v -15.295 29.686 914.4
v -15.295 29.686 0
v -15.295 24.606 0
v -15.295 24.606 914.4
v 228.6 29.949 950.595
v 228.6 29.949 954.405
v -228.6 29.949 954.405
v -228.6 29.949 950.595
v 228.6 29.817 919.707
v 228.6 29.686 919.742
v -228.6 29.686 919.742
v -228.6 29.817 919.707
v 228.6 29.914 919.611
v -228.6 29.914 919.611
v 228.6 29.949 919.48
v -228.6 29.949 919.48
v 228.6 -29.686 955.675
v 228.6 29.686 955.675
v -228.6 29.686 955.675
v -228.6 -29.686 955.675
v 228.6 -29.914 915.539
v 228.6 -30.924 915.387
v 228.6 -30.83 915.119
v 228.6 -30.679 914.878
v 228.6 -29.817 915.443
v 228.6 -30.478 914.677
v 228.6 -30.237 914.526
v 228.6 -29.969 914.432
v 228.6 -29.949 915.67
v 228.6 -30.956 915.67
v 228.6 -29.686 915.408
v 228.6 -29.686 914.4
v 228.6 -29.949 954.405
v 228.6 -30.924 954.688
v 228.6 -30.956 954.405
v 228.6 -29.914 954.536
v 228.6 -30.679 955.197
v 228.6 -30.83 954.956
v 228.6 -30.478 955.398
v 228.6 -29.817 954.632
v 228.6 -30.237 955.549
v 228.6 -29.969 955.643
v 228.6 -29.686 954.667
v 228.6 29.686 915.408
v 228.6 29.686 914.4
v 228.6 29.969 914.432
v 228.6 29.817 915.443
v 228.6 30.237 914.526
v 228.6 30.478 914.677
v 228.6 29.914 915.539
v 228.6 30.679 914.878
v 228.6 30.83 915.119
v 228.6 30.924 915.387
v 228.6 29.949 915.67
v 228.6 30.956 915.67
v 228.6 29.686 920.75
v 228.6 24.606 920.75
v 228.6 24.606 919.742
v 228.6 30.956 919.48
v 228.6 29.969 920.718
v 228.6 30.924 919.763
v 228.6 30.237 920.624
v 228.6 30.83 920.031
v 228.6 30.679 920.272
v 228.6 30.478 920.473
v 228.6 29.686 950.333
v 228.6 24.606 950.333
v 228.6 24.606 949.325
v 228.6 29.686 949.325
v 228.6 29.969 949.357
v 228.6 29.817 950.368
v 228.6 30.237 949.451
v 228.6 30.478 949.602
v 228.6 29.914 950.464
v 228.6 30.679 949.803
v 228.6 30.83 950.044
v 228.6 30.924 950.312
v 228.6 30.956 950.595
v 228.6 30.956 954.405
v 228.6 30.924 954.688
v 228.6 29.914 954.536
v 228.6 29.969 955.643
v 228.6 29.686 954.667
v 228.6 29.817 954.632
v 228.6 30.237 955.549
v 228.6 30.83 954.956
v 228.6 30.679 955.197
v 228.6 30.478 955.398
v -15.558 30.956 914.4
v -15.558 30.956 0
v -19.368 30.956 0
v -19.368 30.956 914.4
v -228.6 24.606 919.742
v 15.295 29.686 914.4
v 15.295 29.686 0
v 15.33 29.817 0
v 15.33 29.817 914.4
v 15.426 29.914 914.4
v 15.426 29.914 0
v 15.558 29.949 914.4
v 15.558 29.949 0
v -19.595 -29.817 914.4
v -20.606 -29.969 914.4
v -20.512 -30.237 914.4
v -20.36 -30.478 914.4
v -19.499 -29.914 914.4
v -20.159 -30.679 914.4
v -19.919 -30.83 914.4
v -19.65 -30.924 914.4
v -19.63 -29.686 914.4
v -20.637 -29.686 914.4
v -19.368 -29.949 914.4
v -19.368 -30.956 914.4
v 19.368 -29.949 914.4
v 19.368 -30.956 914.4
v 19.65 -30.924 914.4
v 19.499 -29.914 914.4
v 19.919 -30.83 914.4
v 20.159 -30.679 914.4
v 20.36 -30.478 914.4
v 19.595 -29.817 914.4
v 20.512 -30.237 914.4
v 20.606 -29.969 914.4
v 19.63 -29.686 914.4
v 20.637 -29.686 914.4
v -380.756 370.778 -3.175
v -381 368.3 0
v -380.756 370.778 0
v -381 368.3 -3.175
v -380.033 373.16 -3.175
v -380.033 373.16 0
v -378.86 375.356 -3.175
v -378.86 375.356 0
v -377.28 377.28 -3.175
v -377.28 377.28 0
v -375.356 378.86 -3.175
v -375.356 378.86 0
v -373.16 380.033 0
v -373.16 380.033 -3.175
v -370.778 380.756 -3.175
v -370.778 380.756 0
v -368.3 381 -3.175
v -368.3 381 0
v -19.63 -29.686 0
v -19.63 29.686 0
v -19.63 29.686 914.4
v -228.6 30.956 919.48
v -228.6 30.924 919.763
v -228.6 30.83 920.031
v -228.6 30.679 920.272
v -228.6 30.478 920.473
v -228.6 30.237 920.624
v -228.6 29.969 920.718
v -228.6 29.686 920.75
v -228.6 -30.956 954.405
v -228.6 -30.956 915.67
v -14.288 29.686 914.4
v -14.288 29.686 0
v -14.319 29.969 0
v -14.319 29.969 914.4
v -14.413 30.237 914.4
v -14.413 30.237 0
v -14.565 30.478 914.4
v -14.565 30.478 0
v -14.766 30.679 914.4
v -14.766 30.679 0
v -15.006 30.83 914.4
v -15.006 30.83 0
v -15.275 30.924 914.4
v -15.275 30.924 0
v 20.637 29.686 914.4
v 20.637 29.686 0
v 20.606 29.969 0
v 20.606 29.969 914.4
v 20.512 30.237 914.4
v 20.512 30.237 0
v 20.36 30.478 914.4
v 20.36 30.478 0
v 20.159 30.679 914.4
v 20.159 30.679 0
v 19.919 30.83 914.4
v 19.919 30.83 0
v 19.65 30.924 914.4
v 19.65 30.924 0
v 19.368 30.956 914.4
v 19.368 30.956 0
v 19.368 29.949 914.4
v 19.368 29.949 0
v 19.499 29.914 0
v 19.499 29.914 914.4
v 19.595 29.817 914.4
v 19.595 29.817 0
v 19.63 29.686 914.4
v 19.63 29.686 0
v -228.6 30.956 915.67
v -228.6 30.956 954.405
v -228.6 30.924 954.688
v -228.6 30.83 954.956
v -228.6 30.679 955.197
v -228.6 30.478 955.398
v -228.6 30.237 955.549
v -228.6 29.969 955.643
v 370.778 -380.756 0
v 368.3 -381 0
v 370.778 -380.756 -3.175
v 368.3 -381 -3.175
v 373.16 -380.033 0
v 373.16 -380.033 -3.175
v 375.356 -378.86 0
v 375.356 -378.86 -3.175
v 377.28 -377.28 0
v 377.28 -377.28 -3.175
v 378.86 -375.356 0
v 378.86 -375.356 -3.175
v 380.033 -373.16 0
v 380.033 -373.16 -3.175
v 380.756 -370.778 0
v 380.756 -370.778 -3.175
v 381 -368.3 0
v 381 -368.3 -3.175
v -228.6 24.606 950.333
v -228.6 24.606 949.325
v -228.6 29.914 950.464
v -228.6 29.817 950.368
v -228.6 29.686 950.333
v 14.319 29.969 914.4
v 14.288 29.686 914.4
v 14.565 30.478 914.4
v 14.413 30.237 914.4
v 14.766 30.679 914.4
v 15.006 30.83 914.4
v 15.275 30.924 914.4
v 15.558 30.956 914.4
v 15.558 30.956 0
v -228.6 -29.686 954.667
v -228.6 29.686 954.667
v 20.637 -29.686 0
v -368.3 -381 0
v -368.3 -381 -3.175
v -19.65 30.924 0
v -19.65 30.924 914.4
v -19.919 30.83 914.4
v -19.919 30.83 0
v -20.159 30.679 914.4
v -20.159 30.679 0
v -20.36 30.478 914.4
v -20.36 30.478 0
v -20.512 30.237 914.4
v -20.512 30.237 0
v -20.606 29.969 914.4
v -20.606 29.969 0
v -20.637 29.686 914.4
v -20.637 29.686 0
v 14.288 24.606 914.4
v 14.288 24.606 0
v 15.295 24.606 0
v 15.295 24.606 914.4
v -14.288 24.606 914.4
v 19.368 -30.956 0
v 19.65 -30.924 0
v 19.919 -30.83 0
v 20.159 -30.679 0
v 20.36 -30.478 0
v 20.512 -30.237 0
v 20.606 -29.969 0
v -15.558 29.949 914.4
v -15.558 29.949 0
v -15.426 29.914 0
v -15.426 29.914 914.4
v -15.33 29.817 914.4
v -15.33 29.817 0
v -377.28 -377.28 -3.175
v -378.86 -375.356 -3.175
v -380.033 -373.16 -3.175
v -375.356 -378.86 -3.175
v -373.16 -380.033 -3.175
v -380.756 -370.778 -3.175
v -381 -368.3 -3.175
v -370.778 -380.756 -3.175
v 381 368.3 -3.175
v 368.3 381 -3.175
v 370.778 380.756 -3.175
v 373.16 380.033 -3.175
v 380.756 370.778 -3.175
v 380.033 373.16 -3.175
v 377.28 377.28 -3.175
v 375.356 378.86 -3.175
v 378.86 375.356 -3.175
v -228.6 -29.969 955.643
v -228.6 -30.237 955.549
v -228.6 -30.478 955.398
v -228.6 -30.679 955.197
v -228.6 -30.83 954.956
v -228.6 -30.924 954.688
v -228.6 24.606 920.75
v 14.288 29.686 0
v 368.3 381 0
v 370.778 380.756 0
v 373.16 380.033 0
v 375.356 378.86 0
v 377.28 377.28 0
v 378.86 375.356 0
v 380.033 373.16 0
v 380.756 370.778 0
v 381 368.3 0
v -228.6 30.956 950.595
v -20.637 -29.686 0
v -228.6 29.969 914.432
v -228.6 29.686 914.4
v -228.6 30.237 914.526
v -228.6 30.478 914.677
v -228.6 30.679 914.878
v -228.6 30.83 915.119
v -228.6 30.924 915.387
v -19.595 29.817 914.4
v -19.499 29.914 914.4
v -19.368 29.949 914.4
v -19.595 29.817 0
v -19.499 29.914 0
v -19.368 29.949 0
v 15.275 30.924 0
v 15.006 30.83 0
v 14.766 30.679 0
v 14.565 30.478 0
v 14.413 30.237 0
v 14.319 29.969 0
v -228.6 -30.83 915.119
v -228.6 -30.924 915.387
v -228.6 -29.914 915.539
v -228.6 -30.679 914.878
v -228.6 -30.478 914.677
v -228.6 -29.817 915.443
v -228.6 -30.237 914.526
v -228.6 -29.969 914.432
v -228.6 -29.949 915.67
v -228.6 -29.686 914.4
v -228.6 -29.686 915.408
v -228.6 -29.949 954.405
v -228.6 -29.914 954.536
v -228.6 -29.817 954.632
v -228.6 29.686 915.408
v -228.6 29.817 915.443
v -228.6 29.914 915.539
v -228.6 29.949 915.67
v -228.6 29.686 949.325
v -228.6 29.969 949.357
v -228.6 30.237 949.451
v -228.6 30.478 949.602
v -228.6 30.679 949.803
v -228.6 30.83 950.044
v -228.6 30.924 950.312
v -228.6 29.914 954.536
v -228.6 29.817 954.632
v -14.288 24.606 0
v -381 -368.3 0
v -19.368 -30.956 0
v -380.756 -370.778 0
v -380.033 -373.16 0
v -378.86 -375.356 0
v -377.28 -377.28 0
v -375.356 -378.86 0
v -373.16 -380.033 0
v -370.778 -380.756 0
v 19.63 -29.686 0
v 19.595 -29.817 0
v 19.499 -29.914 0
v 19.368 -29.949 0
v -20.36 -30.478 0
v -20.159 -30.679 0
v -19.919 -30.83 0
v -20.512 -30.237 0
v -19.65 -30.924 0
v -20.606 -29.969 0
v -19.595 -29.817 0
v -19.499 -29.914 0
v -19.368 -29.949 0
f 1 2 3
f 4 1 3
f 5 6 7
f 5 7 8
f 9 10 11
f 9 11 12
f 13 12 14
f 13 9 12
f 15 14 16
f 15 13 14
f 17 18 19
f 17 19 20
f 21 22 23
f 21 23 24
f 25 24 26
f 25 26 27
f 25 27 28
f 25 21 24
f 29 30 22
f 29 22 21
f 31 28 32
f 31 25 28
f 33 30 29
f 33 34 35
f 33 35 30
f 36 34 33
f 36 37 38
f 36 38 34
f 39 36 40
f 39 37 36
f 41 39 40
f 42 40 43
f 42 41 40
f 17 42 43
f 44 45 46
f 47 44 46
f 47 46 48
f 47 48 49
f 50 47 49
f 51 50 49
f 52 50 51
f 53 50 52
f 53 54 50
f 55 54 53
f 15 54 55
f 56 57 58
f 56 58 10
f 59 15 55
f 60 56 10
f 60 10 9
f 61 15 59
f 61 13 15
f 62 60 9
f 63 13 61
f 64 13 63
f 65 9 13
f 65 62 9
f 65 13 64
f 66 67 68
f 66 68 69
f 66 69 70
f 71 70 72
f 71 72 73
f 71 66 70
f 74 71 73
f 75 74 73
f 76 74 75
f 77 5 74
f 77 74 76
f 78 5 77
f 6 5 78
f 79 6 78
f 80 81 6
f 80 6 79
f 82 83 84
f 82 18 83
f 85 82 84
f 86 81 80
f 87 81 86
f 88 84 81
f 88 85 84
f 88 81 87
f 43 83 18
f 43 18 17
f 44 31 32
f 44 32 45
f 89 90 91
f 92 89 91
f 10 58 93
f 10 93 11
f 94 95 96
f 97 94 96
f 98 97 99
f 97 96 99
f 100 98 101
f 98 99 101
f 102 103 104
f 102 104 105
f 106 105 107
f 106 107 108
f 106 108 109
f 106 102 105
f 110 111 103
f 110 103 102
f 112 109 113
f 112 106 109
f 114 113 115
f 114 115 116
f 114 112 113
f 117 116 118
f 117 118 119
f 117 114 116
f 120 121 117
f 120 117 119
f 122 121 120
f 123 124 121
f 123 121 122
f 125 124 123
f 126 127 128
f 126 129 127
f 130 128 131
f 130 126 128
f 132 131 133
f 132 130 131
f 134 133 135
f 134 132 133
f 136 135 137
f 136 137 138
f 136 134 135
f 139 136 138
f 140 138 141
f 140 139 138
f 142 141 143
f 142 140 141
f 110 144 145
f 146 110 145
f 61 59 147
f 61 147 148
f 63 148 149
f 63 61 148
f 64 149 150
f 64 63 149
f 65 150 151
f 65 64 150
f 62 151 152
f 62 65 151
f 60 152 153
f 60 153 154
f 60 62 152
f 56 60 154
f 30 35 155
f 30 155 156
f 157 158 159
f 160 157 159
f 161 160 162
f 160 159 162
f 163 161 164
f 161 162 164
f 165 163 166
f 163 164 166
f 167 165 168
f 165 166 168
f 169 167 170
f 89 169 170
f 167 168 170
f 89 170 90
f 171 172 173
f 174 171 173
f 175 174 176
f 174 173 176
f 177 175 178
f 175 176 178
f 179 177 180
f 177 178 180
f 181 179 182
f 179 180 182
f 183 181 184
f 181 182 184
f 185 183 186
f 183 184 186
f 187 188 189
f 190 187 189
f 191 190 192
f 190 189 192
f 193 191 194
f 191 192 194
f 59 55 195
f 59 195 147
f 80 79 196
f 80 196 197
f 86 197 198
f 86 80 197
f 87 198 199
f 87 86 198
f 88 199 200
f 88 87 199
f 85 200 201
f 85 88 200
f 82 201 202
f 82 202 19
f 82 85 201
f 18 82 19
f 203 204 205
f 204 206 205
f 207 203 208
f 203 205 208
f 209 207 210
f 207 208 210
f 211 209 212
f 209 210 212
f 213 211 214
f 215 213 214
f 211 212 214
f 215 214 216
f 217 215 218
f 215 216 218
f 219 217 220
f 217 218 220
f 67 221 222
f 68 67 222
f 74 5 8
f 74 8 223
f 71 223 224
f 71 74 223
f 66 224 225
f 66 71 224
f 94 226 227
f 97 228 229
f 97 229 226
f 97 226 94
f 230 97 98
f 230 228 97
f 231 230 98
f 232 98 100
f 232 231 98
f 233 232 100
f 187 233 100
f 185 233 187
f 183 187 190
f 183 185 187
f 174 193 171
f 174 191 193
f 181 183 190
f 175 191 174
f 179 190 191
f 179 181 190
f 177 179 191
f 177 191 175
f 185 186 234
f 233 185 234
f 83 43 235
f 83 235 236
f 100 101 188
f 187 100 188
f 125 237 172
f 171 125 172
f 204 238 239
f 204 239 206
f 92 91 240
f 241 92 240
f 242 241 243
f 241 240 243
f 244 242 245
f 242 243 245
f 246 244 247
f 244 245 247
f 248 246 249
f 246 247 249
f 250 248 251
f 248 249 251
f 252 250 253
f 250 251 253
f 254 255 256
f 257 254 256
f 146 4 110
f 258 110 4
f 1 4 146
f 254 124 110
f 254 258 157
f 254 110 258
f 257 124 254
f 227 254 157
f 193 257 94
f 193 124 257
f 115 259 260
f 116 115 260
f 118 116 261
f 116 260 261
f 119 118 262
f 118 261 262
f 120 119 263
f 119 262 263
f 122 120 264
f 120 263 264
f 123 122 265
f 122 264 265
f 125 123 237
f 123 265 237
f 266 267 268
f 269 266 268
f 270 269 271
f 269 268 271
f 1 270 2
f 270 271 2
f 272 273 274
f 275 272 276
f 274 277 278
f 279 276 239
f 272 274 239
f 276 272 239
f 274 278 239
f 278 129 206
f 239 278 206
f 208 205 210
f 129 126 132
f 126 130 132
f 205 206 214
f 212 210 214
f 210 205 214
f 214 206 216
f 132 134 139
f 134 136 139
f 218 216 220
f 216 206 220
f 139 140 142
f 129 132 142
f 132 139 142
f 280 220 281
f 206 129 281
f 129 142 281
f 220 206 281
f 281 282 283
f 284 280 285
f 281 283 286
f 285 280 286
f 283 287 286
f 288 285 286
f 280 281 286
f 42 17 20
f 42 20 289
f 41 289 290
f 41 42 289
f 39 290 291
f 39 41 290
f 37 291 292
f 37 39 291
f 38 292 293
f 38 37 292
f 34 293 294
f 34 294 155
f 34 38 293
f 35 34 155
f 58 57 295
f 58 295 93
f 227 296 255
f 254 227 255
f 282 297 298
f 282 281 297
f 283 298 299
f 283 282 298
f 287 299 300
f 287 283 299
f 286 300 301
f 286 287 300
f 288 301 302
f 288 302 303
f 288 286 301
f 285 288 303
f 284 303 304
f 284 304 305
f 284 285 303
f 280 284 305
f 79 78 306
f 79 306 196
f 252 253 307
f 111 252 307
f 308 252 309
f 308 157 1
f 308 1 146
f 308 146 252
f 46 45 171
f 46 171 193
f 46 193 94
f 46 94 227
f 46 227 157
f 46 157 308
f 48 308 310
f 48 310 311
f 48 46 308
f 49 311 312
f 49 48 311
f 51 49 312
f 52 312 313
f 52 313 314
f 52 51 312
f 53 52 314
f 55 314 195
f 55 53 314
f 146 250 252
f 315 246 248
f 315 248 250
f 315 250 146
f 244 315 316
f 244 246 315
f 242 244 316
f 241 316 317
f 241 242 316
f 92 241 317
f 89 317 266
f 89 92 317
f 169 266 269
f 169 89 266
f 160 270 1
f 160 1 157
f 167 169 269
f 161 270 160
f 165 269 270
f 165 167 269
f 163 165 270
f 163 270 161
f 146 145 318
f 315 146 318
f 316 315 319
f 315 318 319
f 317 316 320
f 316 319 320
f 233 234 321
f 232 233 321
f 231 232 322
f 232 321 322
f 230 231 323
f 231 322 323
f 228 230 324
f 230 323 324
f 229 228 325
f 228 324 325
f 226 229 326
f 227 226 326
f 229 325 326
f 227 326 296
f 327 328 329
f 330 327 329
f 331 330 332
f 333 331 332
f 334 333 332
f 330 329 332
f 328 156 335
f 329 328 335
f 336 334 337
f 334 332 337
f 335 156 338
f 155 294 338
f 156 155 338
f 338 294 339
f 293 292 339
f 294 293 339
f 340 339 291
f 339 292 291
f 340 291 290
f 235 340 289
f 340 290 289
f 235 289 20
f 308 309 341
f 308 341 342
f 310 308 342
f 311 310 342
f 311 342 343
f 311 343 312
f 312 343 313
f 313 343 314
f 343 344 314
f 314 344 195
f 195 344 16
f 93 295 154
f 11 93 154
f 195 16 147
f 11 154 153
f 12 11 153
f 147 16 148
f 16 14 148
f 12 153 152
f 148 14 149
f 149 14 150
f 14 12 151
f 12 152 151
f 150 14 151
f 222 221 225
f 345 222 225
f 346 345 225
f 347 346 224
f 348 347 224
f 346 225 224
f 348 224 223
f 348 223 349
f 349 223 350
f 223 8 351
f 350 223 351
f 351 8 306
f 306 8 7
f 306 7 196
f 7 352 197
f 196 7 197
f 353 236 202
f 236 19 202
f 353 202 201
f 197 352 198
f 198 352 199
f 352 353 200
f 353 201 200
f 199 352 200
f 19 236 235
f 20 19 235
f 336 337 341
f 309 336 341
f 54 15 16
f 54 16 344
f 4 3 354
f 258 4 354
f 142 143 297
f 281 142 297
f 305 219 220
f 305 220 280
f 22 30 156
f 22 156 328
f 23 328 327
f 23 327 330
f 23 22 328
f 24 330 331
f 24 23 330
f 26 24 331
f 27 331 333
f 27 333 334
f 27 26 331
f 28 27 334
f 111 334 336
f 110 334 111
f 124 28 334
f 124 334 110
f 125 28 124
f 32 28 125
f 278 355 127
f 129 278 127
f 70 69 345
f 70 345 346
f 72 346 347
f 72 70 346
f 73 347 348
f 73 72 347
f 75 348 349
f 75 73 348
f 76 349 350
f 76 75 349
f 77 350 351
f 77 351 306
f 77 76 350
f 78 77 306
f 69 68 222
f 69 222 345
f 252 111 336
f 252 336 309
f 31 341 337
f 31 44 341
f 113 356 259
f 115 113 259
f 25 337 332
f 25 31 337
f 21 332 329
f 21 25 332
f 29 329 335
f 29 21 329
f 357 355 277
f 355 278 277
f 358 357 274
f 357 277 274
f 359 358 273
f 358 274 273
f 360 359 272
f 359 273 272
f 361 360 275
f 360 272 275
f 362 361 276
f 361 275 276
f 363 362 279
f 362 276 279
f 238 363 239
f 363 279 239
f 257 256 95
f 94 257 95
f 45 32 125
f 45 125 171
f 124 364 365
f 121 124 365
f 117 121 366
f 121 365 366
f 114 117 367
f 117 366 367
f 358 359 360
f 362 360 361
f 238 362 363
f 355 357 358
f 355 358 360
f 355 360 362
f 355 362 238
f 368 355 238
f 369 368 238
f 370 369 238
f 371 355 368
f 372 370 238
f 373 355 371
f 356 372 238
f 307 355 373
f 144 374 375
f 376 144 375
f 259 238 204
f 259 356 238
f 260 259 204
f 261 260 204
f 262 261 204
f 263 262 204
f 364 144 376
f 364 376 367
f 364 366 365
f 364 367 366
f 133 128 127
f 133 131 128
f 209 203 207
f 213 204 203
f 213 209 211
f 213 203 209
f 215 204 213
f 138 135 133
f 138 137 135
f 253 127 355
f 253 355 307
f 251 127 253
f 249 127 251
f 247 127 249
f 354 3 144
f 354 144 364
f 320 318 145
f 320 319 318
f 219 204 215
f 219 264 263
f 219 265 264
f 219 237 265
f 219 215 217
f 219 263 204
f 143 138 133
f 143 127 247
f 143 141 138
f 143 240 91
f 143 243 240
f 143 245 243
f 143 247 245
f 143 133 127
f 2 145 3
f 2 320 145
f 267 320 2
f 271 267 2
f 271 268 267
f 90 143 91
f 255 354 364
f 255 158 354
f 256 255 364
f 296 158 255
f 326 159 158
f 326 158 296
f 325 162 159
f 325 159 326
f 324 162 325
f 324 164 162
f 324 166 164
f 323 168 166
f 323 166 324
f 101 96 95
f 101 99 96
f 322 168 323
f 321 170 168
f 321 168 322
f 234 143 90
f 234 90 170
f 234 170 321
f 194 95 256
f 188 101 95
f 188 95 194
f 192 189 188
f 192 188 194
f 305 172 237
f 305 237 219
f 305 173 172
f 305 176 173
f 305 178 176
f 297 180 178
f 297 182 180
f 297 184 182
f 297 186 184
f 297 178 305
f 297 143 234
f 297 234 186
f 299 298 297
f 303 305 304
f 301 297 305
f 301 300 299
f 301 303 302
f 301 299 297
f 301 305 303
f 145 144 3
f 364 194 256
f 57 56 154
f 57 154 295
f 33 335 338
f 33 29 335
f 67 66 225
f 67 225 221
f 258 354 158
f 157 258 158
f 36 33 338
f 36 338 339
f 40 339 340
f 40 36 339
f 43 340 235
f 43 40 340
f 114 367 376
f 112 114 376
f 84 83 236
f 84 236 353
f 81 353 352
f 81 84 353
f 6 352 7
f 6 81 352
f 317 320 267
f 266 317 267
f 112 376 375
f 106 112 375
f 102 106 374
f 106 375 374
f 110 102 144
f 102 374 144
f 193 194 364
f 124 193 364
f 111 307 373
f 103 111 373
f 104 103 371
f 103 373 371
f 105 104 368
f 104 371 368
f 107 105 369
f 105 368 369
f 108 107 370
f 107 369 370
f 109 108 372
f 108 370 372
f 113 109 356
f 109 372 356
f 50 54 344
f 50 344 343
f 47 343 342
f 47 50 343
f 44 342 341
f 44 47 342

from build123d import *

# Parameters (mm, degrees)
F1_DEPTH = 914.4
F2_W     = 762
F2_H     = 762
F3_DEPTH = 3.175
F4_R     = 12.7
F6_DEPTH = 228.6


with BuildPart() as f1:
    # F0 (on Top) → F1 (new body)
    with BuildSketch(Plane.XY):
        with BuildLine():
            Line((-19.3675, -30.95625), (0, -30.95625))
            Line((0, -30.95625), (19.3675, -30.95625))
            ThreePointArc((19.3675, -30.95625), (20.265526, -30.584276), (20.6375, -29.68625))
            Line((20.6375, -29.68625), (20.6375, 29.68625))
            ThreePointArc((20.6375, 29.68625), (20.265526, 30.584276), (19.3675, 30.95625))
            Line((19.3675, 30.95625), (15.5575, 30.95625))
            ThreePointArc((15.5575, 30.95625), (14.659474, 30.584276), (14.2875, 29.68625))
            Line((14.2875, 29.68625), (14.2875, 24.60625))
            Line((14.2875, 24.60625), (15.29505, 24.60625))
            Line((15.29505, 24.60625), (15.29505, 29.68625))
            ThreePointArc((15.29505, 29.68625), (15.37192, 29.87183), (15.5575, 29.9487))
            Line((15.5575, 29.9487), (19.3675, 29.9487))
            ThreePointArc((19.3675, 29.9487), (19.55308, 29.87183), (19.62995, 29.68625))
            Line((19.62995, 29.68625), (19.62995, -29.68625))
            ThreePointArc((19.62995, -29.68625), (19.55308, -29.87183), (19.3675, -29.9487))
            Line((19.3675, -29.9487), (0, -29.9487))
            Line((0, -29.9487), (-19.3675, -29.9487))
            ThreePointArc((-19.3675, -29.9487), (-19.55308, -29.87183), (-19.62995, -29.68625))
            Line((-19.62995, -29.68625), (-19.62995, 29.68625))
            ThreePointArc((-19.62995, 29.68625), (-19.55308, 29.87183), (-19.3675, 29.9487))
            Line((-19.3675, 29.9487), (-15.5575, 29.9487))
            ThreePointArc((-15.5575, 29.9487), (-15.37192, 29.87183), (-15.29505, 29.68625))
            Line((-15.29505, 29.68625), (-15.29505, 24.60625))
            Line((-15.29505, 24.60625), (-14.2875, 24.60625))
            Line((-14.2875, 24.60625), (-14.2875, 29.68625))
            ThreePointArc((-14.2875, 29.68625), (-14.659474, 30.584276), (-15.5575, 30.95625))
            Line((-15.5575, 30.95625), (-19.3675, 30.95625))
            ThreePointArc((-19.3675, 30.95625), (-20.265526, 30.584276), (-20.6375, 29.68625))
            Line((-20.6375, 29.68625), (-20.6375, -29.68625))
            ThreePointArc((-20.6375, -29.68625), (-20.265526, -30.584276), (-19.3675, -30.95625))
        make_face()
    extrude(amount=F1_DEPTH)

    # F2 (on Top) → F3 (join)
    with BuildSketch(Plane.XY):
        Rectangle(F2_W, F2_H)
    extrude(amount=-F3_DEPTH)

    # F4
    f4_edges = [f1.edges().sort_by_distance(p)[0] for p in [
        (381, -381, -1.5875),
        (381, 381, -1.5875),
        (-381, 381, -1.5875),
        (-381, -381, -1.5875),
    ]]
    fillet(f4_edges, radius=F4_R)

    # F5 (on Right) → F6 (join, symmetric)
    with BuildSketch(Plane.YZ):
        with BuildLine():
            Line((-29.9487, 915.67), (-29.9487, 954.405))
            ThreePointArc((-29.9487, 954.405), (-29.87183, 954.59058), (-29.68625, 954.66745))
            Line((-29.68625, 954.66745), (29.68625, 954.66745))
            ThreePointArc((29.68625, 954.66745), (29.87183, 954.59058), (29.9487, 954.405))
            Line((29.9487, 954.405), (29.9487, 950.595))
            ThreePointArc((29.9487, 950.595), (29.87183, 950.40942), (29.68625, 950.33255))
            Line((29.68625, 950.33255), (24.60625, 950.33255))
            Line((24.60625, 950.33255), (24.60625, 949.325))
            Line((24.60625, 949.325), (29.68625, 949.325))
            ThreePointArc((29.68625, 949.325), (30.584276, 949.696974), (30.95625, 950.595))
            Line((30.95625, 950.595), (30.95625, 954.405))
            ThreePointArc((30.95625, 954.405), (30.584276, 955.303026), (29.68625, 955.675))
            Line((29.68625, 955.675), (-29.68625, 955.675))
            ThreePointArc((-29.68625, 955.675), (-30.584276, 955.303026), (-30.95625, 954.405))
            Line((-30.95625, 954.405), (-30.95625, 935.0375))
            Line((-30.95625, 935.0375), (-30.95625, 915.67))
            ThreePointArc((-30.95625, 915.67), (-30.584276, 914.771974), (-29.68625, 914.4))
            Line((-29.68625, 914.4), (29.68625, 914.4))
            ThreePointArc((29.68625, 914.4), (30.584276, 914.771974), (30.95625, 915.67))
            Line((30.95625, 915.67), (30.95625, 919.48))
            ThreePointArc((30.95625, 919.48), (30.584276, 920.378026), (29.68625, 920.75))
            Line((29.68625, 920.75), (24.60625, 920.75))
            Line((24.60625, 920.75), (24.60625, 919.74245))
            Line((24.60625, 919.74245), (29.68625, 919.74245))
            ThreePointArc((29.68625, 919.74245), (29.87183, 919.66558), (29.9487, 919.48))
            Line((29.9487, 919.48), (29.9487, 915.67))
            ThreePointArc((29.9487, 915.67), (29.87183, 915.48442), (29.68625, 915.40755))
            Line((29.68625, 915.40755), (-29.68625, 915.40755))
            ThreePointArc((-29.68625, 915.40755), (-29.87183, 915.48442), (-29.9487, 915.67))
        make_face()
    extrude(amount=F6_DEPTH, both=True)


solid = f1.part
